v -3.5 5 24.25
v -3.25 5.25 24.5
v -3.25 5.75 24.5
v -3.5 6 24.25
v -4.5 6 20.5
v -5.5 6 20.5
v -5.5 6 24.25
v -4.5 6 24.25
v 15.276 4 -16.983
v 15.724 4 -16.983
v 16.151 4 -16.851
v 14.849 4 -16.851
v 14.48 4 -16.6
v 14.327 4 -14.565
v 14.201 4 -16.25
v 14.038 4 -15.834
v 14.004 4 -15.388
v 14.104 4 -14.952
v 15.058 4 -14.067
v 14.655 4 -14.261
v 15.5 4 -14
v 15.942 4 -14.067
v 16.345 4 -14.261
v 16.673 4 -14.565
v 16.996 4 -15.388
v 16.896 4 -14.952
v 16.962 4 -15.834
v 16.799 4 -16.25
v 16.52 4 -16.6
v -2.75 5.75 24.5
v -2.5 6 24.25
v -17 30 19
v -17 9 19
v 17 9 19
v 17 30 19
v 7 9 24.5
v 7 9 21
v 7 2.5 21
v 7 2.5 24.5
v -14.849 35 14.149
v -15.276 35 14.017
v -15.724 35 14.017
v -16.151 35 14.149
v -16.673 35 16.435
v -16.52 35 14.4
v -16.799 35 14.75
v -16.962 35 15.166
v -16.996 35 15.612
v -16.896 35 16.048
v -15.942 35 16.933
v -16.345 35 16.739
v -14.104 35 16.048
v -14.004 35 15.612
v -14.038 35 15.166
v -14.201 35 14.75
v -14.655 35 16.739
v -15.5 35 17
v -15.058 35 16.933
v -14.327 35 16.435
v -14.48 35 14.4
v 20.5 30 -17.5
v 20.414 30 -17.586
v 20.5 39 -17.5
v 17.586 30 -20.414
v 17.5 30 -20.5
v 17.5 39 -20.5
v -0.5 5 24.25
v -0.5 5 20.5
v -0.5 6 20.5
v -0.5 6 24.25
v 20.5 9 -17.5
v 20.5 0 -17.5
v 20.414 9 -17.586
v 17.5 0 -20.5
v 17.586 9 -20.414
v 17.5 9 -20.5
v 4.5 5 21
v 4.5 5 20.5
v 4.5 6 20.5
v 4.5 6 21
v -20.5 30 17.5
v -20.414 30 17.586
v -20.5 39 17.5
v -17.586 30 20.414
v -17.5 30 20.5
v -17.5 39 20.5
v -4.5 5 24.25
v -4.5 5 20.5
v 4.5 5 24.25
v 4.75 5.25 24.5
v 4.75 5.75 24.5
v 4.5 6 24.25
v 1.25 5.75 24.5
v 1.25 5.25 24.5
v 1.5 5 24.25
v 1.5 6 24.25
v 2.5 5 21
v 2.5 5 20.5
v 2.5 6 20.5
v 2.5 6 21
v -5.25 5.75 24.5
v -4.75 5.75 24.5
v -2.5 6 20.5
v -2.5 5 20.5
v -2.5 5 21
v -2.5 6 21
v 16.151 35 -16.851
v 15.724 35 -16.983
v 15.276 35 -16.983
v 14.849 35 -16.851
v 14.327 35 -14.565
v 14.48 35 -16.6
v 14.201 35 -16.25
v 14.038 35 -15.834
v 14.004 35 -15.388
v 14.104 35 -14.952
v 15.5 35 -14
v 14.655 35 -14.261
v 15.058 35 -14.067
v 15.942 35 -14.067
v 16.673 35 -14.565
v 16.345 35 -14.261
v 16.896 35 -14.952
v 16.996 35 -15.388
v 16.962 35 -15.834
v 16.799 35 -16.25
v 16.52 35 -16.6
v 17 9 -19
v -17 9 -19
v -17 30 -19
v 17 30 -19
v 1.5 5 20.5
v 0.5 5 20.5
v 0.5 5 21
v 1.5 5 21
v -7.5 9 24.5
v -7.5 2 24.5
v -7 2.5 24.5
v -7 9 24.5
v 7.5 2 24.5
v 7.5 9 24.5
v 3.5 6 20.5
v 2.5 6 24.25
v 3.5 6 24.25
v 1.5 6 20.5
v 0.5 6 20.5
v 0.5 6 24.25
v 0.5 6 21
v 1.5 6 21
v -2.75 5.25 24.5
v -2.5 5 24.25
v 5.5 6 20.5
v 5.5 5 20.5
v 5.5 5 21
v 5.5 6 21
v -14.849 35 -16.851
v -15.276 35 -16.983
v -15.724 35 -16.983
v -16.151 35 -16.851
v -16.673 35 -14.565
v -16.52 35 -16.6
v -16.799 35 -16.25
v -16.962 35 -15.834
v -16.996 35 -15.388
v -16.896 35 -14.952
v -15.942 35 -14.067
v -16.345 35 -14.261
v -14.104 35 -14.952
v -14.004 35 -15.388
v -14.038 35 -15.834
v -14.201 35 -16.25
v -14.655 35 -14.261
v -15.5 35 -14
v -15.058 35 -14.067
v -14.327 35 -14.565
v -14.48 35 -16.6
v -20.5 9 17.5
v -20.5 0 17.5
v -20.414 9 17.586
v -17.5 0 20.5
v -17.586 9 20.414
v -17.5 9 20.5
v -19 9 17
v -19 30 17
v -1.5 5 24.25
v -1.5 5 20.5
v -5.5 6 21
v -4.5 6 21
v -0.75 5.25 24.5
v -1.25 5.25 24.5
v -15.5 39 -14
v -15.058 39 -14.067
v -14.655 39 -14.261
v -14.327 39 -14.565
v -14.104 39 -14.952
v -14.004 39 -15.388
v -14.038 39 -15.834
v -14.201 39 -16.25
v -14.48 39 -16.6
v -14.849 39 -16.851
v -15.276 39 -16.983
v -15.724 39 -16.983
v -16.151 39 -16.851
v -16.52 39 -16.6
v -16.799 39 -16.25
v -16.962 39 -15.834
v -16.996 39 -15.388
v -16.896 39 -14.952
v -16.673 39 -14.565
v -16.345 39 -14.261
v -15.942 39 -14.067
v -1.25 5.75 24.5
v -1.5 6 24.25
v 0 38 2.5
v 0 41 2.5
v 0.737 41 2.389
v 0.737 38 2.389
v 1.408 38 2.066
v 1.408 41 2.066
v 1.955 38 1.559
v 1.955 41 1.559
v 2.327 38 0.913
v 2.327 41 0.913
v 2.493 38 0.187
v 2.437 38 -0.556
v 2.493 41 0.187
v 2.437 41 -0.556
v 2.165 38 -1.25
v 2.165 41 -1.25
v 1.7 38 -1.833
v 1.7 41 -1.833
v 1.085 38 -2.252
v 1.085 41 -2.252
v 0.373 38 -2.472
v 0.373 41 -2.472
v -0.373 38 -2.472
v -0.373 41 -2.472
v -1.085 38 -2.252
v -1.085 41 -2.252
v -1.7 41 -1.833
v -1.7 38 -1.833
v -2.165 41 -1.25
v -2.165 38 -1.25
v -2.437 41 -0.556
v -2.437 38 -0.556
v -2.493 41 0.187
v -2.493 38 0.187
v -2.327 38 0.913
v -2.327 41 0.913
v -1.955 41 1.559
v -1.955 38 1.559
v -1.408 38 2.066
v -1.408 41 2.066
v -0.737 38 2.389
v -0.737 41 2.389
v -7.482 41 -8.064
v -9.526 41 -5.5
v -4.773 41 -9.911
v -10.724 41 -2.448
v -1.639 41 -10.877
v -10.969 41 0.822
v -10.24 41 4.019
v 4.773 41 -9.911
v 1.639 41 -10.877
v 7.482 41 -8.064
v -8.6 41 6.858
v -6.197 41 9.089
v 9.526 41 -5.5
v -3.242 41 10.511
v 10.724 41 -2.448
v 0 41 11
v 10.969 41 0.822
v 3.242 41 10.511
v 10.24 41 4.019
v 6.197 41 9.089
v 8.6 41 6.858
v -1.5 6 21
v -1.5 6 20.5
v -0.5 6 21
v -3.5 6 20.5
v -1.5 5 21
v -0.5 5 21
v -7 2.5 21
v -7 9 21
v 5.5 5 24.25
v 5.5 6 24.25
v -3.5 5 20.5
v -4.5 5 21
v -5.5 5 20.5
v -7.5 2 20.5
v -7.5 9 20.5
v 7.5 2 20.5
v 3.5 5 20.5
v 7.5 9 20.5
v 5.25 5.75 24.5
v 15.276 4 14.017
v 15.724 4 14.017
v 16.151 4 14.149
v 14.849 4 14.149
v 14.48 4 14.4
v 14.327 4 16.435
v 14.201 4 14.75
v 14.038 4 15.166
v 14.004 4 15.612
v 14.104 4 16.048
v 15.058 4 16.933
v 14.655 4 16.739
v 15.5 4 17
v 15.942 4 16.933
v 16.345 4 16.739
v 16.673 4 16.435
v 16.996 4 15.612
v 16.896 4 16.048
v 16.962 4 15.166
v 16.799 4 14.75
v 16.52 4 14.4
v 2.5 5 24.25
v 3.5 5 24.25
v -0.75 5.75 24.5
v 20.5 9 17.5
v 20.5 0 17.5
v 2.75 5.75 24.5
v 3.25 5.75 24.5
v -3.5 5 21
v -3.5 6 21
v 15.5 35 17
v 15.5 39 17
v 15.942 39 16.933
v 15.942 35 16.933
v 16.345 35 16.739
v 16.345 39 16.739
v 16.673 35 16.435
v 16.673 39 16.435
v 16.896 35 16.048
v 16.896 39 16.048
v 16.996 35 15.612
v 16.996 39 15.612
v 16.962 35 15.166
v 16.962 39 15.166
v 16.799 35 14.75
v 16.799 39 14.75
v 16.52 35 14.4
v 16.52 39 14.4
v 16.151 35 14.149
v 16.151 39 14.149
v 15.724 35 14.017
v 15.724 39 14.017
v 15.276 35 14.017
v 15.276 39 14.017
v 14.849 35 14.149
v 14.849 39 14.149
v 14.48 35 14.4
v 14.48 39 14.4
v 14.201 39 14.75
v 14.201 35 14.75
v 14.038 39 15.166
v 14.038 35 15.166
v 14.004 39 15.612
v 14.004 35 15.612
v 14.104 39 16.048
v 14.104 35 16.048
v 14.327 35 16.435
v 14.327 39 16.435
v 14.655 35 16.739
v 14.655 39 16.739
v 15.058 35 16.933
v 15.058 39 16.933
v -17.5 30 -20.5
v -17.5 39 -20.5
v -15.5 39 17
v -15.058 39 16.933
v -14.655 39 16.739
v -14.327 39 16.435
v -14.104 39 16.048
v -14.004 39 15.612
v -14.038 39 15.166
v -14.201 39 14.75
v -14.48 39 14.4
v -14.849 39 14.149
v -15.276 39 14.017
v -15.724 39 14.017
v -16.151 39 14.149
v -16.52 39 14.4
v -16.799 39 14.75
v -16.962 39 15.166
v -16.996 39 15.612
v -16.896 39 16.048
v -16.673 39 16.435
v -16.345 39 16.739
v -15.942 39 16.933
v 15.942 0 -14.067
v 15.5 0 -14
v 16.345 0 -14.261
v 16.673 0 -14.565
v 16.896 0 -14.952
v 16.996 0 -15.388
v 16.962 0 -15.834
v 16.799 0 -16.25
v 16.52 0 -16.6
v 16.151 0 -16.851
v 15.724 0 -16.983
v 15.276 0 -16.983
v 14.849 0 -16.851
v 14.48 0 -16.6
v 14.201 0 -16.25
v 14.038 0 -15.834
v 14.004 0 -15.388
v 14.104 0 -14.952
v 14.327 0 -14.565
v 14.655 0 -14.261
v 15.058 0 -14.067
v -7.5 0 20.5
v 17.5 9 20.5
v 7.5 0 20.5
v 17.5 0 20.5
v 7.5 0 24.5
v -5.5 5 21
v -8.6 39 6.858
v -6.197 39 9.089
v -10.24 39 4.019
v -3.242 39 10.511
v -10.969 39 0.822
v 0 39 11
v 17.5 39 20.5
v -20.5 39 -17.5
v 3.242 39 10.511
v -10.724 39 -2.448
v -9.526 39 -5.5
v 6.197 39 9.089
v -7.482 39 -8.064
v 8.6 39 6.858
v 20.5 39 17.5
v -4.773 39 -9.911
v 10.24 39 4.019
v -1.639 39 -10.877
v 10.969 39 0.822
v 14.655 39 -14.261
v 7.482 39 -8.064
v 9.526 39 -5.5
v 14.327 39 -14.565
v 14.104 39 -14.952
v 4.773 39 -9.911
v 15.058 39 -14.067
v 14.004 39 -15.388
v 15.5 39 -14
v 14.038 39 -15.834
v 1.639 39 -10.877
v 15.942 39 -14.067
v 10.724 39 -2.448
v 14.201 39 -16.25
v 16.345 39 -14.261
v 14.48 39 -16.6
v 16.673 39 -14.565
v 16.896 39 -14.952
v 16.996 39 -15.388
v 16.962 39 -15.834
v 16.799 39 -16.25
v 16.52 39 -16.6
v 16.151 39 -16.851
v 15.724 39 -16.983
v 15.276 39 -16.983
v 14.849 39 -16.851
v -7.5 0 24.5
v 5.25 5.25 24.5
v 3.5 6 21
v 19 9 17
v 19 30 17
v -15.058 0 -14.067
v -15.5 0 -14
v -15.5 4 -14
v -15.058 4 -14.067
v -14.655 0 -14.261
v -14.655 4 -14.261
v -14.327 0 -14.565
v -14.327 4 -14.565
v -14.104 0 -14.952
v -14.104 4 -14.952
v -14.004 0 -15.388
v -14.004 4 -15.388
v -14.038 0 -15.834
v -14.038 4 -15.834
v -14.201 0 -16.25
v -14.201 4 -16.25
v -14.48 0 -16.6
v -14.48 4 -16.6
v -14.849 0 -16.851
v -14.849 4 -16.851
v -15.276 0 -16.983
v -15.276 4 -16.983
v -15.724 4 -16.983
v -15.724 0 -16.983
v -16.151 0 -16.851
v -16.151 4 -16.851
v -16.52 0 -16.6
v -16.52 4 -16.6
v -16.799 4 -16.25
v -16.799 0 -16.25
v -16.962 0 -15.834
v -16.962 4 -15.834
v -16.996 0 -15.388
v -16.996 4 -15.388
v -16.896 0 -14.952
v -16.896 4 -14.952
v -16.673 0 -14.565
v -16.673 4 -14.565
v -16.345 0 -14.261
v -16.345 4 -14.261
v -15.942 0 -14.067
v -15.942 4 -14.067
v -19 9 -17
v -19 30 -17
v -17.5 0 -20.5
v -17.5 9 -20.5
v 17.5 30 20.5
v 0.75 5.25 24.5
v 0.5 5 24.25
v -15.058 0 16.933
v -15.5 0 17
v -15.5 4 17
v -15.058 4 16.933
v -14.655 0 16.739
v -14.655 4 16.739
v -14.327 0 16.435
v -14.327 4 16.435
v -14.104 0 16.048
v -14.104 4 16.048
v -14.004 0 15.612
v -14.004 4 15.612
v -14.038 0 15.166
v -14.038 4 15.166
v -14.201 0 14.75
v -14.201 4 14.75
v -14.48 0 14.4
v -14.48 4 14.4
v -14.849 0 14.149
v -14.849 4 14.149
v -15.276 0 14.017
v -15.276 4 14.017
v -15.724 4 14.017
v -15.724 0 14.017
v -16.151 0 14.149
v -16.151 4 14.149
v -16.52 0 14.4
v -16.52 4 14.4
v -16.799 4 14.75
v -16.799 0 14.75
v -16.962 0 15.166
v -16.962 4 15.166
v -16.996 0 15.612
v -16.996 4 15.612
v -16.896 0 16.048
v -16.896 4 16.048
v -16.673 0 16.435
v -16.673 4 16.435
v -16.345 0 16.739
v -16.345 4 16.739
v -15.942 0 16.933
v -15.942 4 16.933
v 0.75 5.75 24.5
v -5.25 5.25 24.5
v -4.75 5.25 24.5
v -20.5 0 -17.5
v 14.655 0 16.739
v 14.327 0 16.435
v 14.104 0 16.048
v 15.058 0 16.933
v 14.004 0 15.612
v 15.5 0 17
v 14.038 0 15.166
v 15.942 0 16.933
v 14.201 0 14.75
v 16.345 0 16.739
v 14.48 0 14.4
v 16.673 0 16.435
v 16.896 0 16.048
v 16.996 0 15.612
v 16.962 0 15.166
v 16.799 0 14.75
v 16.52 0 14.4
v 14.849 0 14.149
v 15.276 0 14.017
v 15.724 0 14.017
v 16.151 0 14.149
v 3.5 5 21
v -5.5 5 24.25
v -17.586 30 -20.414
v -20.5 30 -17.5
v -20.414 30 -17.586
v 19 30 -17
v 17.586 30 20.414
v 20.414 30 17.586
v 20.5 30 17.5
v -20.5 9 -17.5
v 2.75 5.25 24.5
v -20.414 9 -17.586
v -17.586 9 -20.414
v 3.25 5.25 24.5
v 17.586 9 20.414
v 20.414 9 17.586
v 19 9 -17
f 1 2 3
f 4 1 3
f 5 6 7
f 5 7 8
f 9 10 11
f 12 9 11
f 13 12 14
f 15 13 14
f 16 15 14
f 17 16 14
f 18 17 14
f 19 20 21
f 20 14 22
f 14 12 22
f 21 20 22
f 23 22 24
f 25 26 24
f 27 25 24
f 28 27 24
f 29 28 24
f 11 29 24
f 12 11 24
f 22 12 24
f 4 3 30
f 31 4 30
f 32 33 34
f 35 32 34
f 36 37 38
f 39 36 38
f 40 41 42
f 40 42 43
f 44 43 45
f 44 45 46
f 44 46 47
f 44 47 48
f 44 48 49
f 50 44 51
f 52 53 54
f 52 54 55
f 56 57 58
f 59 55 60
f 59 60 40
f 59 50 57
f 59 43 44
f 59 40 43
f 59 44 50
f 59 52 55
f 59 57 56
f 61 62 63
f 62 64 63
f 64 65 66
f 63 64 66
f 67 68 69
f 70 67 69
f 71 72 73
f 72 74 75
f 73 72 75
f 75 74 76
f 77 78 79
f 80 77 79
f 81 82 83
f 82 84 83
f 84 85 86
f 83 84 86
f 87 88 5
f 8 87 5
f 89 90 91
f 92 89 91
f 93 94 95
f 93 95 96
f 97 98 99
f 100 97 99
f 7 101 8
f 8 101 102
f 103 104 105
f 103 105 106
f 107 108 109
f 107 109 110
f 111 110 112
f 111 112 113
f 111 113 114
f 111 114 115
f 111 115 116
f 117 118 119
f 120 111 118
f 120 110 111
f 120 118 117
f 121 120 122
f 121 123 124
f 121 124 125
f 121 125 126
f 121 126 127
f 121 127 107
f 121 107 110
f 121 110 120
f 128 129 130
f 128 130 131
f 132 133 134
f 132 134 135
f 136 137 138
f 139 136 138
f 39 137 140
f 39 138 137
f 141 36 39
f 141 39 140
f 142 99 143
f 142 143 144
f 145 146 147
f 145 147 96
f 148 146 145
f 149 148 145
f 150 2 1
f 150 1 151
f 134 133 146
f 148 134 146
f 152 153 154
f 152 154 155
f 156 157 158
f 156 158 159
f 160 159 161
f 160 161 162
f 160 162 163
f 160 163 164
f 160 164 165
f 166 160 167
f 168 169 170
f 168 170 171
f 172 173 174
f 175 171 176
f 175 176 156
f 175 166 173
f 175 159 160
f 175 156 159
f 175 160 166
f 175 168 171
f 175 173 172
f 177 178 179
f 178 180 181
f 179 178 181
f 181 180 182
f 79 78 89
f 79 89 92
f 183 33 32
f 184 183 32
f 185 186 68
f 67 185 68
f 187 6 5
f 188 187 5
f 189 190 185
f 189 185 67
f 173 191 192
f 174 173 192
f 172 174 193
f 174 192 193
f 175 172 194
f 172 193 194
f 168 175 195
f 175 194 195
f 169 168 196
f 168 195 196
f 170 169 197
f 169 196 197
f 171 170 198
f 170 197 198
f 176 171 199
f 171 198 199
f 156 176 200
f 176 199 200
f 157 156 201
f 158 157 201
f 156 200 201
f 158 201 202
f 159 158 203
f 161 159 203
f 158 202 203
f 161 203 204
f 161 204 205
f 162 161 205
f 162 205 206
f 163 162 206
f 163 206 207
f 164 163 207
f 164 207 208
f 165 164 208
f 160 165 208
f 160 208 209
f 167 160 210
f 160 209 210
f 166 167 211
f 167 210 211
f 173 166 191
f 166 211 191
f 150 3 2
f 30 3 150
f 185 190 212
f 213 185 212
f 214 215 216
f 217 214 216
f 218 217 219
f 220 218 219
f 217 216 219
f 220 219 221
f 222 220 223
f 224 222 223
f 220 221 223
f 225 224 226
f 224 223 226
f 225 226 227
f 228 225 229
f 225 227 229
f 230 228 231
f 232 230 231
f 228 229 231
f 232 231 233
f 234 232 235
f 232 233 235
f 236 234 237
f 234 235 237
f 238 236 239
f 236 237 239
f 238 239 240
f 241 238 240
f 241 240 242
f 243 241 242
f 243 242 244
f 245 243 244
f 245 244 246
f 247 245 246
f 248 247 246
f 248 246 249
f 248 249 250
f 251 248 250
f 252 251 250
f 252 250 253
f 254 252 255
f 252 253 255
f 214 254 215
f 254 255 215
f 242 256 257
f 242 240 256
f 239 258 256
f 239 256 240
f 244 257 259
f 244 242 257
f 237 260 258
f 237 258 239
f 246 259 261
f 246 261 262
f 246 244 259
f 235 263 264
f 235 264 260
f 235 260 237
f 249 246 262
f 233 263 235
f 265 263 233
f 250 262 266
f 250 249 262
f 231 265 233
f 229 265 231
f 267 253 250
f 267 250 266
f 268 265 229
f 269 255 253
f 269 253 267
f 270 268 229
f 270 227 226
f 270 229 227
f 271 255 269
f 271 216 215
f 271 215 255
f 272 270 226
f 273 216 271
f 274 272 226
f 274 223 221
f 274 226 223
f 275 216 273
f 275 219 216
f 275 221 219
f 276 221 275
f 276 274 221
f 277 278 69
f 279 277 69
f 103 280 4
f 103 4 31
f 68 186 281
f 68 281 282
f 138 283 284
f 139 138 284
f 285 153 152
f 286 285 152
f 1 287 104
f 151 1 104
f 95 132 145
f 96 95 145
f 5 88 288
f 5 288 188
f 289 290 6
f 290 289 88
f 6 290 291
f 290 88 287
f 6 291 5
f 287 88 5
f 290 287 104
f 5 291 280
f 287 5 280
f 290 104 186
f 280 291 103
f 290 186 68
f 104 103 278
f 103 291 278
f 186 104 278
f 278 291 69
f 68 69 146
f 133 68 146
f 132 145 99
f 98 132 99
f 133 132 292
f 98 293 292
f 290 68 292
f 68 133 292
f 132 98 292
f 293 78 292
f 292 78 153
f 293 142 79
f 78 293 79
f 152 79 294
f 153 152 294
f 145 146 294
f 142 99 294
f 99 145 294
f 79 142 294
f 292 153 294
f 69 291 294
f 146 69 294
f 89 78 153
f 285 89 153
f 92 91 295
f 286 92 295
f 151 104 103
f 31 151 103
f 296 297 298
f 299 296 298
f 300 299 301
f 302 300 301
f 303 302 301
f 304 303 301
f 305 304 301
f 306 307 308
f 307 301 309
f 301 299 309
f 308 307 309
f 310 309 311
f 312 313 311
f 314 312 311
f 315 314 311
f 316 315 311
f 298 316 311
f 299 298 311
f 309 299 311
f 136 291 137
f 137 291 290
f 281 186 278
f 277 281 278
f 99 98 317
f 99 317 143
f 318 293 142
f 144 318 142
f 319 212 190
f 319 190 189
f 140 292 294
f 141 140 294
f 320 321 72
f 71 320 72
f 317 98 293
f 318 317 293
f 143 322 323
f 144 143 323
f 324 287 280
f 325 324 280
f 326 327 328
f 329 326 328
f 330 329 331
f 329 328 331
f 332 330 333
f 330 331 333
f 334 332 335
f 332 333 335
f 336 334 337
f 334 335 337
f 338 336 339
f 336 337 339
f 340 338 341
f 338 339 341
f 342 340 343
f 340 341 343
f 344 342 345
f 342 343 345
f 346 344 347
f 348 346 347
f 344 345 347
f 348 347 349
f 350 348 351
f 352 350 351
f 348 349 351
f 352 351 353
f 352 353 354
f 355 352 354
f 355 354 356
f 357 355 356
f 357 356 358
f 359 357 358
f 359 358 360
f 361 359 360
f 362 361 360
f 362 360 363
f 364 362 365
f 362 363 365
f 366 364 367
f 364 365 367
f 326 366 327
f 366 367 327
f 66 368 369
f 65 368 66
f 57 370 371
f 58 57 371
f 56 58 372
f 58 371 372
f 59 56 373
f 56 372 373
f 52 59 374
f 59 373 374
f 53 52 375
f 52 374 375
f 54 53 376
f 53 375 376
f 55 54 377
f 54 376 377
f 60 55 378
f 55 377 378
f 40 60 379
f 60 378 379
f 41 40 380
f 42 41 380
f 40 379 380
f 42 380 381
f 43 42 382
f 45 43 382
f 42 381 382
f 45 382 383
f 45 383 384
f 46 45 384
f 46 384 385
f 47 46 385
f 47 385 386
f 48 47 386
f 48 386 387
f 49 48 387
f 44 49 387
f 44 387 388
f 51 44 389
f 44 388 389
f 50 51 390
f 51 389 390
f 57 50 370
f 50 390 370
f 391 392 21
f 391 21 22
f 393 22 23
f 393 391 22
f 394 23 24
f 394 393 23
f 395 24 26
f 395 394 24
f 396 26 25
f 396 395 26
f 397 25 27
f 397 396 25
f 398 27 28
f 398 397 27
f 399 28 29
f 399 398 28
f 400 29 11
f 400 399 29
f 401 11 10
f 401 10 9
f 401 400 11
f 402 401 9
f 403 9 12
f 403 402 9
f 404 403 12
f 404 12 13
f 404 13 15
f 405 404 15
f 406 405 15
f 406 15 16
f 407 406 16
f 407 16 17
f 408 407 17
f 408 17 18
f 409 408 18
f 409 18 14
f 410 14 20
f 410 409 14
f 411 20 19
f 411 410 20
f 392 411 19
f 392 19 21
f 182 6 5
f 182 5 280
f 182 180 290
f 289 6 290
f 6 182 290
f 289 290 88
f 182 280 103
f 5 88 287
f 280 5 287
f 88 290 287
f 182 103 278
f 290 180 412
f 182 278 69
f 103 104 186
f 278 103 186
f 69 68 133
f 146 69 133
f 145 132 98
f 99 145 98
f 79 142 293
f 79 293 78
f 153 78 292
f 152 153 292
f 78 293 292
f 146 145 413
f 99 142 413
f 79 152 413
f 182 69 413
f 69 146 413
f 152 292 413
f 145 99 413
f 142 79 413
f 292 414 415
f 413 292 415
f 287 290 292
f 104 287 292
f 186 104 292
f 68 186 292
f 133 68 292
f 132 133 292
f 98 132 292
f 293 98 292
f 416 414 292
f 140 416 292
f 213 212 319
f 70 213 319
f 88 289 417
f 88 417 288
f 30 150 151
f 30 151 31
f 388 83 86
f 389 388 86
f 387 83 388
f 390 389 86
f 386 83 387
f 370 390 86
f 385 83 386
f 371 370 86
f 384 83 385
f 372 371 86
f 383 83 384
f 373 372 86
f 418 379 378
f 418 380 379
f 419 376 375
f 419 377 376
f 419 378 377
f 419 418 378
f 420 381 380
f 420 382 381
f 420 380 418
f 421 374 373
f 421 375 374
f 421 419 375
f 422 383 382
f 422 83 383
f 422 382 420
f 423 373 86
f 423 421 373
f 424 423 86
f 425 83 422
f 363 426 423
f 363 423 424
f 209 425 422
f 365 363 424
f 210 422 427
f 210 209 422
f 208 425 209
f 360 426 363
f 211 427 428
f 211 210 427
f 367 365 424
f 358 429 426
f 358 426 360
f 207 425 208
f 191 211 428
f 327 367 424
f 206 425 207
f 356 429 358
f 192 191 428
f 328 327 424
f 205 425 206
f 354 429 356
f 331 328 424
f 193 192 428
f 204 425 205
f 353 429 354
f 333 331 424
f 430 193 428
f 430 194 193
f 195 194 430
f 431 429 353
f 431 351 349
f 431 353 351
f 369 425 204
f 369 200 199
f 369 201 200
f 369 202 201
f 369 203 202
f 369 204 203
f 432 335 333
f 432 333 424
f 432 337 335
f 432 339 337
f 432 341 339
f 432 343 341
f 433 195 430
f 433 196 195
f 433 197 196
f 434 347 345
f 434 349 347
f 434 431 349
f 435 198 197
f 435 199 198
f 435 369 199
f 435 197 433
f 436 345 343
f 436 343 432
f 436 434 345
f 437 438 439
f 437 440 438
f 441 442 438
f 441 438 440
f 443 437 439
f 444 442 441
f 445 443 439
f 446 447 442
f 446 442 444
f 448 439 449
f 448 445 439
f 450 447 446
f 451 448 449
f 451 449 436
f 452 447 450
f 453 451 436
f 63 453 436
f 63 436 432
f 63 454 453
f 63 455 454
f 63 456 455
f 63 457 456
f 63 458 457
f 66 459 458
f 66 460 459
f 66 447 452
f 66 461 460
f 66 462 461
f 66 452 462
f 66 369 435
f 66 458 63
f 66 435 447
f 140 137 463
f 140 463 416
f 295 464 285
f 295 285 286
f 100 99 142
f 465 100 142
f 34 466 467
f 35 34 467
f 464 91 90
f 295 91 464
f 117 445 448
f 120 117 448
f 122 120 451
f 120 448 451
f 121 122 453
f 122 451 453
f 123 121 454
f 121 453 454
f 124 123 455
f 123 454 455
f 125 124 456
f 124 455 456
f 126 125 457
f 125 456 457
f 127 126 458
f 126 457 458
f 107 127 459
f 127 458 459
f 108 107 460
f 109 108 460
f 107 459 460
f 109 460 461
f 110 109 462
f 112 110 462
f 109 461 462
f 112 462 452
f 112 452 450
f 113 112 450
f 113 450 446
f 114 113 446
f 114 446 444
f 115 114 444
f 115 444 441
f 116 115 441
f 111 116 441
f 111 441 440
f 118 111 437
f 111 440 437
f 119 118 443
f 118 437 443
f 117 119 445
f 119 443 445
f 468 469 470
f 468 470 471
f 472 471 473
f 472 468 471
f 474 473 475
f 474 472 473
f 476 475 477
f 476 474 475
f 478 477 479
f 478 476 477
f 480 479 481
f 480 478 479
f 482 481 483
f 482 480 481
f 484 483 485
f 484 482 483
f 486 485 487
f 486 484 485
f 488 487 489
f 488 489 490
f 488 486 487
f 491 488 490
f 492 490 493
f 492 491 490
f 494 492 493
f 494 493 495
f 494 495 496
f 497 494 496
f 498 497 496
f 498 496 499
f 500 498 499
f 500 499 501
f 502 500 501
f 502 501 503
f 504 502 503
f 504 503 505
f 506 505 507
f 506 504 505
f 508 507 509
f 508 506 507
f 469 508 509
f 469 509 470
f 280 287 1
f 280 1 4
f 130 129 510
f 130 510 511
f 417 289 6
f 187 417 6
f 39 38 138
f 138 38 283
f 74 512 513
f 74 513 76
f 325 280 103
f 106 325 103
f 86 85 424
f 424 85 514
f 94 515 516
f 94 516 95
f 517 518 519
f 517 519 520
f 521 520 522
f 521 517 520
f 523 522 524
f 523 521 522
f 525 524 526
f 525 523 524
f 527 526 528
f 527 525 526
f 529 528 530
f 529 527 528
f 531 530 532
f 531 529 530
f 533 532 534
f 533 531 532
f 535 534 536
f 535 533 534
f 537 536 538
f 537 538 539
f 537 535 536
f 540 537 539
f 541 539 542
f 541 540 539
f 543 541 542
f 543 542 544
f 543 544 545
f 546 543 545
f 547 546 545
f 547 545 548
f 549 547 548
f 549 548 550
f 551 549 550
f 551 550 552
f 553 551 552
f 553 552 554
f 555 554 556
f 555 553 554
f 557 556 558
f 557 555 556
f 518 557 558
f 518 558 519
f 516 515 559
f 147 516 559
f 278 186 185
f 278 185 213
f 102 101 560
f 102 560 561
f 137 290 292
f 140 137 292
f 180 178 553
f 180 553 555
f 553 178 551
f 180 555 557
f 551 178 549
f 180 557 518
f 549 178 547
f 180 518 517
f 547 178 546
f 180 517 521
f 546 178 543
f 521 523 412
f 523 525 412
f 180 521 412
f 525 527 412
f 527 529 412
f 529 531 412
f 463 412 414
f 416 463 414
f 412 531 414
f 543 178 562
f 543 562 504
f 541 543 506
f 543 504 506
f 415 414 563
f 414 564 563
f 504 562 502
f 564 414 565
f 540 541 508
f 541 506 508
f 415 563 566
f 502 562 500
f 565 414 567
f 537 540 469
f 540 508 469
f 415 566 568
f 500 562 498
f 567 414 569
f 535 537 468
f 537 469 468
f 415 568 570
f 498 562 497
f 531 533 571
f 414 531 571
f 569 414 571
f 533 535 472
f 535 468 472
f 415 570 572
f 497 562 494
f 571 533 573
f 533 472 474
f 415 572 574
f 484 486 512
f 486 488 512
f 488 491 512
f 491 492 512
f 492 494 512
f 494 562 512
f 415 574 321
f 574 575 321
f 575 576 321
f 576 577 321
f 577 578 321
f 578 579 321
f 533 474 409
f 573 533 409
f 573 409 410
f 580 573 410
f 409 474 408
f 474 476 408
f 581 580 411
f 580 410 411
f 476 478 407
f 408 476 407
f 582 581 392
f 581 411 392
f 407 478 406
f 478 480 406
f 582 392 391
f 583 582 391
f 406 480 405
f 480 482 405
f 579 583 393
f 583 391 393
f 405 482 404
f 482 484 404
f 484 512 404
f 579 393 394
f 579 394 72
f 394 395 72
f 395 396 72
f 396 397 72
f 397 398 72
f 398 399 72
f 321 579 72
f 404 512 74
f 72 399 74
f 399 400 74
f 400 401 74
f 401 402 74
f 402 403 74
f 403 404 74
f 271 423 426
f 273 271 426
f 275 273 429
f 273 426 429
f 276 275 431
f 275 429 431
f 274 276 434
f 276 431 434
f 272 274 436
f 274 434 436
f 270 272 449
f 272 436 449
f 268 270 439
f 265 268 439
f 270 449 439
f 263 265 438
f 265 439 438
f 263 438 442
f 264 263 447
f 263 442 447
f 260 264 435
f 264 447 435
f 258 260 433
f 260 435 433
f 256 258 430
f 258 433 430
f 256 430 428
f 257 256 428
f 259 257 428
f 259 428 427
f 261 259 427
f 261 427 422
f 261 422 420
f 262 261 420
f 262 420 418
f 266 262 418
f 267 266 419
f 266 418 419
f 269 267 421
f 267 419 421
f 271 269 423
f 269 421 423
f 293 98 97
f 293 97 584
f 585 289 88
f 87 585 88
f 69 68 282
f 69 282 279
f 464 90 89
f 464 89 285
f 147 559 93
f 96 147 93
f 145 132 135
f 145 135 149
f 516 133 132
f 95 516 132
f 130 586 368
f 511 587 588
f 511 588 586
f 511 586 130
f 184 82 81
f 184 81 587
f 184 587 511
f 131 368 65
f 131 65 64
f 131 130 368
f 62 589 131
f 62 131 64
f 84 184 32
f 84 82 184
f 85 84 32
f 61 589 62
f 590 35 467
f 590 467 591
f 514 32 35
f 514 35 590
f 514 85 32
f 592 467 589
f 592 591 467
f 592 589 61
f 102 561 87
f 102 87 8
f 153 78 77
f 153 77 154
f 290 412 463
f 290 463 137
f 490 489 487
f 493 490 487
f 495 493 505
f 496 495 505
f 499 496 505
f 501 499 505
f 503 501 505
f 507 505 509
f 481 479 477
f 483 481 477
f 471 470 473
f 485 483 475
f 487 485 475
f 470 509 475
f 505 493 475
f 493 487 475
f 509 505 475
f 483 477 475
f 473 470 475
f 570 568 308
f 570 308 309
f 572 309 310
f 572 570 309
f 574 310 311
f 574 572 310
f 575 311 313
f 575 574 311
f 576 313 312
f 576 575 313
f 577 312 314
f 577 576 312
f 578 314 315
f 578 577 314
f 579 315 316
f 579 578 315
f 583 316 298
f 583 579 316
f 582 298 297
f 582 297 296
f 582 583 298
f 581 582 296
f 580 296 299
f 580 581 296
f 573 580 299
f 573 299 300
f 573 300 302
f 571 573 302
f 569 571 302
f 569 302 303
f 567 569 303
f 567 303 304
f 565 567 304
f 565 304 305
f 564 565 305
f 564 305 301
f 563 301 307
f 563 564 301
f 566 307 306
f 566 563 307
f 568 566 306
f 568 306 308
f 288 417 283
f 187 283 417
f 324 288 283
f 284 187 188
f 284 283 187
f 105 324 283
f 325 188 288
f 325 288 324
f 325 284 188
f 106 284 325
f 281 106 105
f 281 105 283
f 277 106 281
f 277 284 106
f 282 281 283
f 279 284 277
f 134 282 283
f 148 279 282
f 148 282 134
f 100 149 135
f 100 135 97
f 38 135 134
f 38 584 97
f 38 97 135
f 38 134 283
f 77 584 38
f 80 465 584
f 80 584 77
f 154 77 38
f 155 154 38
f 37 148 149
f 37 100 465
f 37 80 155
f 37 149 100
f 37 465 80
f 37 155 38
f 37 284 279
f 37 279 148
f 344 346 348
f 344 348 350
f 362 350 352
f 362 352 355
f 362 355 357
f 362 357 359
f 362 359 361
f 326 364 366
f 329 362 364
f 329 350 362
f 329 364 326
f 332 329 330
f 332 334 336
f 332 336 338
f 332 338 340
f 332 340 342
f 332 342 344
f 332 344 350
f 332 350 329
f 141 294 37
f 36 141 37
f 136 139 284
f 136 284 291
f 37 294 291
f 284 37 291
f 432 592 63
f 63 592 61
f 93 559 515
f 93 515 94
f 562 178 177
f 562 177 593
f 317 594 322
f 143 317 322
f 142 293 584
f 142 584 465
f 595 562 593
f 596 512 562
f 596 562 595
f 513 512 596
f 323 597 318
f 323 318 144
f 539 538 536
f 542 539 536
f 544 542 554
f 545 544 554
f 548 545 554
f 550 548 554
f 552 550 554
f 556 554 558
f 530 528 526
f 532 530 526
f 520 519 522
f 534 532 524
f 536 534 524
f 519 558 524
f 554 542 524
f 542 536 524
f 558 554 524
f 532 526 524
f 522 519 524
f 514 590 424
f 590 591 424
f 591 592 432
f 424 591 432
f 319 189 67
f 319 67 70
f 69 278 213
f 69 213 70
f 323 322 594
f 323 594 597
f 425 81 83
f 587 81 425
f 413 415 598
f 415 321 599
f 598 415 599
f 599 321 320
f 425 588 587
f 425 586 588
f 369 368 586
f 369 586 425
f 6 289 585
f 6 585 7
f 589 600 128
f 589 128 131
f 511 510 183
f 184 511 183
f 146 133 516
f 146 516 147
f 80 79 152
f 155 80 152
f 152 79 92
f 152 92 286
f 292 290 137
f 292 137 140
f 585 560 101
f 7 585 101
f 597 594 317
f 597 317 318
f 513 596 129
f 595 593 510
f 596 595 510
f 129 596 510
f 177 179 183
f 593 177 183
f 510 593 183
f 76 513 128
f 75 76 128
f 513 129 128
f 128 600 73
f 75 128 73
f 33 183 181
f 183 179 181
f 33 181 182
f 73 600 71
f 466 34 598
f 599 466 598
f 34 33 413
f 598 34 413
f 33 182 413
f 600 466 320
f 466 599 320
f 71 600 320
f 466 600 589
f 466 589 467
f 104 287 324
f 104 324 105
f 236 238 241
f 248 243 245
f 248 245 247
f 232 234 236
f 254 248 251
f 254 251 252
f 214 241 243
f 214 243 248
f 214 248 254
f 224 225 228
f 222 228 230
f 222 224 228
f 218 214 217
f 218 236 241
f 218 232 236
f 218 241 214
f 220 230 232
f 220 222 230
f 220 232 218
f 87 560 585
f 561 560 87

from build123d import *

# Parameters (mm, degrees)
SKETCH2_W           = 41
SKETCH2_H           = 41
BOSS_EXTRUDE1_DEPTH = 39
CHAMFER1_SIZE       = 3
SKETCH3_R           = 1.5
CUT_EXTRUDE1_DEPTH  = 4
SKETCH4_R           = 11
BOSS_EXTRUDE2_DEPTH = 2
CUT_EXTRUDE3_START  = -9
SKETCH7_OUTSIDE_W   = 57.202
SKETCH7_OUTSIDE_H   = 57.202
SKETCH7_OUTSIDE_W_2 = 38
SKETCH7_OUTSIDE_H_2 = 38
CUT_EXTRUDE3_DEPTH  = 21
CHAMFER5_SIZE       = 2
SKETCH5_R           = 2.5
CUT_EXTRUDE4_DEPTH  = 3
SKETCH8_W           = 15
SKETCH8_H           = 2
BOSS_EXTRUDE3_DEPTH = 4
SKETCH8_4_W         = 15
SKETCH8_4_H         = 7
SKETCH8_4_W_2       = 1
SKETCH8_4_H_2       = 1
BOSS_EXTRUDE4_DEPTH = 0.5
BOSS_EXTRUDE5_DEPTH = 4
SKETCH8_6_W         = 1
SKETCH8_6_H         = 1
BOSS_EXTRUDE6_DEPTH = 4
CHAMFER6_SIZE       = 0.25


with BuildPart() as part:
    # Sketch2 → Boss-Extrude1 (new body)
    with BuildSketch(Plane(origin=(0, 0, 0), x_dir=(1, 0, 0), z_dir=(0, 1, 0))):
        Rectangle(SKETCH2_W, SKETCH2_H)
    extrude(amount=BOSS_EXTRUDE1_DEPTH)

    # Chamfer1
    chamfer1_edges = [part.edges().sort_by_distance(p)[0] for p in [
        (20.5, 19.5, 20.5),
        (-20.5, 19.5, 20.5),
        (-20.5, 19.5, -20.5),
        (20.5, 19.5, -20.5),
    ]]
    chamfer(chamfer1_edges, length=CHAMFER1_SIZE)

    # Sketch3 → Cut-Extrude1 (cut)
    with BuildSketch(Plane(origin=(0, 39, 0), x_dir=(1, 0, 0), z_dir=(0, 1, 0))):
        with Locations((-15.5, -15.5)):
            Circle(SKETCH3_R)
        with Locations((15.5, -15.5)):
            Circle(SKETCH3_R)
        with Locations((-15.5, 15.5)):
            Circle(SKETCH3_R)
        with Locations((15.5, 15.5)):
            Circle(SKETCH3_R)
    cut_extrude1 = extrude(amount=-CUT_EXTRUDE1_DEPTH, mode=Mode.SUBTRACT)

    # Mirror1: Cut-Extrude1 across plane
    add(cut_extrude1.mirror(Plane(origin=(0, 19.5, 0), x_dir=(0, 0, 1), z_dir=(0, -1, 0))), mode=Mode.SUBTRACT)

    # Sketch4 → Boss-Extrude2 (add)
    with BuildSketch(Plane(origin=(0, 39, 0), x_dir=(1, 0, 0), z_dir=(0, 1, 0))):
        Circle(SKETCH4_R)
    extrude(amount=BOSS_EXTRUDE2_DEPTH)

    # Sketch7 outside → Cut-Extrude3 (cut)
    with BuildSketch(Plane.XZ.offset(CUT_EXTRUDE3_START)):
        Rectangle(SKETCH7_OUTSIDE_W, SKETCH7_OUTSIDE_H)
        Rectangle(SKETCH7_OUTSIDE_W_2, SKETCH7_OUTSIDE_H_2, mode=Mode.SUBTRACT)
    extrude(amount=-CUT_EXTRUDE3_DEPTH, mode=Mode.SUBTRACT)

    # Chamfer5
    chamfer5_edges = [part.edges().sort_by_distance(p)[0] for p in [
        (-19, 19.5, 19),
        (-19, 19.5, -19),
        (19, 19.5, -19),
        (19, 19.5, 19),
    ]]
    chamfer(chamfer5_edges, length=CHAMFER5_SIZE)

    # Sketch5 → Cut-Extrude4 (cut)
    with BuildSketch(Plane(origin=(0, 41, 0), x_dir=(1, 0, 0), z_dir=(0, 1, 0))):
        Circle(SKETCH5_R)
    extrude(amount=-CUT_EXTRUDE4_DEPTH, mode=Mode.SUBTRACT)

    # Sketch8 → Boss-Extrude3 (add)
    with BuildSketch(Plane.XY.offset(20.5)):
        with Locations((0, 1)):
            Rectangle(SKETCH8_W, SKETCH8_H)
    extrude(amount=BOSS_EXTRUDE3_DEPTH)

    # Sketch8<6> → Boss-Extrude6 (add)
    with BuildSketch(Plane.XY.offset(20.5)):
        with Locations((3, 5.5)):
            Rectangle(SKETCH8_6_W, SKETCH8_6_H)
        with Locations((5, 5.5)):
            Rectangle(SKETCH8_6_W, SKETCH8_6_H)
        with Locations((1, 5.5)):
            Rectangle(SKETCH8_6_W, SKETCH8_6_H)
        with Locations((-1, 5.5)):
            Rectangle(SKETCH8_6_W, SKETCH8_6_H)
        with Locations((-3, 5.5)):
            Rectangle(SKETCH8_6_W, SKETCH8_6_H)
        with Locations((-5, 5.5)):
            Rectangle(SKETCH8_6_W, SKETCH8_6_H)
    extrude(amount=BOSS_EXTRUDE6_DEPTH)

    # Chamfer6
    chamfer6_edges = [part.edges().sort_by_distance(p)[0] for p in [
        (4.5, 5.5, 24.5),
        (5, 6, 24.5),
        (5.5, 5.5, 24.5),
        (5, 5, 24.5),
        (3.5, 5.5, 24.5),
        (3, 5, 24.5),
        (2.5, 5.5, 24.5),
        (3, 6, 24.5),
        (1.5, 5.5, 24.5),
        (1, 5, 24.5),
        (0.5, 5.5, 24.5),
        (1, 6, 24.5),
        (-0.5, 5.5, 24.5),
        (-1, 5, 24.5),
        (-1.5, 5.5, 24.5),
        (-1, 6, 24.5),
        (-2.5, 5.5, 24.5),
        (-3, 5, 24.5),
        (-3.5, 5.5, 24.5),
        (-3, 6, 24.5),
        (-4.5, 5.5, 24.5),
        (-5, 5, 24.5),
        (-5.5, 5.5, 24.5),
        (-5, 6, 24.5),
    ]]
    chamfer(chamfer6_edges, length=CHAMFER6_SIZE)


with BuildPart() as body_2:
    # Sketch8<4> → Boss-Extrude4 (new body)
    with BuildSketch(Plane.XY.offset(20.5)):
        with Locations((0, 5.5)):
            Rectangle(SKETCH8_4_W, SKETCH8_4_H)
        with Locations((3, 5.5)):
            Rectangle(SKETCH8_4_W_2, SKETCH8_4_H_2, mode=Mode.SUBTRACT)
        with Locations((5, 5.5)):
            Rectangle(SKETCH8_4_W_2, SKETCH8_4_H_2, mode=Mode.SUBTRACT)
        with Locations((-5, 5.5)):
            Rectangle(SKETCH8_4_W_2, SKETCH8_4_H_2, mode=Mode.SUBTRACT)
        with Locations((-3, 5.5)):
            Rectangle(SKETCH8_4_W_2, SKETCH8_4_H_2, mode=Mode.SUBTRACT)
        with Locations((-1, 5.5)):
            Rectangle(SKETCH8_4_W_2, SKETCH8_4_H_2, mode=Mode.SUBTRACT)
        with Locations((1, 5.5)):
            Rectangle(SKETCH8_4_W_2, SKETCH8_4_H_2, mode=Mode.SUBTRACT)
    extrude(amount=BOSS_EXTRUDE4_DEPTH)


with BuildPart() as body_3:
    # Sketch8<5> → Boss-Extrude5 (new body)
    with BuildSketch(Plane.XY.offset(20.5)):
        Polygon((-7.5, 9), (-7.5, 2), (7.5, 2), (7.5, 9), (7, 9), (7, 8.5), (7, 2.5), (-7, 2.5), (-7, 8.5), (-7, 9), align=None)
    extrude(amount=BOSS_EXTRUDE5_DEPTH)


with BuildPart() as body_2_1:
    add(body_2.part)

    # Combine1: union body 3
    add(body_3.part)


solid = Compound([part.part, body_2_1.part])
